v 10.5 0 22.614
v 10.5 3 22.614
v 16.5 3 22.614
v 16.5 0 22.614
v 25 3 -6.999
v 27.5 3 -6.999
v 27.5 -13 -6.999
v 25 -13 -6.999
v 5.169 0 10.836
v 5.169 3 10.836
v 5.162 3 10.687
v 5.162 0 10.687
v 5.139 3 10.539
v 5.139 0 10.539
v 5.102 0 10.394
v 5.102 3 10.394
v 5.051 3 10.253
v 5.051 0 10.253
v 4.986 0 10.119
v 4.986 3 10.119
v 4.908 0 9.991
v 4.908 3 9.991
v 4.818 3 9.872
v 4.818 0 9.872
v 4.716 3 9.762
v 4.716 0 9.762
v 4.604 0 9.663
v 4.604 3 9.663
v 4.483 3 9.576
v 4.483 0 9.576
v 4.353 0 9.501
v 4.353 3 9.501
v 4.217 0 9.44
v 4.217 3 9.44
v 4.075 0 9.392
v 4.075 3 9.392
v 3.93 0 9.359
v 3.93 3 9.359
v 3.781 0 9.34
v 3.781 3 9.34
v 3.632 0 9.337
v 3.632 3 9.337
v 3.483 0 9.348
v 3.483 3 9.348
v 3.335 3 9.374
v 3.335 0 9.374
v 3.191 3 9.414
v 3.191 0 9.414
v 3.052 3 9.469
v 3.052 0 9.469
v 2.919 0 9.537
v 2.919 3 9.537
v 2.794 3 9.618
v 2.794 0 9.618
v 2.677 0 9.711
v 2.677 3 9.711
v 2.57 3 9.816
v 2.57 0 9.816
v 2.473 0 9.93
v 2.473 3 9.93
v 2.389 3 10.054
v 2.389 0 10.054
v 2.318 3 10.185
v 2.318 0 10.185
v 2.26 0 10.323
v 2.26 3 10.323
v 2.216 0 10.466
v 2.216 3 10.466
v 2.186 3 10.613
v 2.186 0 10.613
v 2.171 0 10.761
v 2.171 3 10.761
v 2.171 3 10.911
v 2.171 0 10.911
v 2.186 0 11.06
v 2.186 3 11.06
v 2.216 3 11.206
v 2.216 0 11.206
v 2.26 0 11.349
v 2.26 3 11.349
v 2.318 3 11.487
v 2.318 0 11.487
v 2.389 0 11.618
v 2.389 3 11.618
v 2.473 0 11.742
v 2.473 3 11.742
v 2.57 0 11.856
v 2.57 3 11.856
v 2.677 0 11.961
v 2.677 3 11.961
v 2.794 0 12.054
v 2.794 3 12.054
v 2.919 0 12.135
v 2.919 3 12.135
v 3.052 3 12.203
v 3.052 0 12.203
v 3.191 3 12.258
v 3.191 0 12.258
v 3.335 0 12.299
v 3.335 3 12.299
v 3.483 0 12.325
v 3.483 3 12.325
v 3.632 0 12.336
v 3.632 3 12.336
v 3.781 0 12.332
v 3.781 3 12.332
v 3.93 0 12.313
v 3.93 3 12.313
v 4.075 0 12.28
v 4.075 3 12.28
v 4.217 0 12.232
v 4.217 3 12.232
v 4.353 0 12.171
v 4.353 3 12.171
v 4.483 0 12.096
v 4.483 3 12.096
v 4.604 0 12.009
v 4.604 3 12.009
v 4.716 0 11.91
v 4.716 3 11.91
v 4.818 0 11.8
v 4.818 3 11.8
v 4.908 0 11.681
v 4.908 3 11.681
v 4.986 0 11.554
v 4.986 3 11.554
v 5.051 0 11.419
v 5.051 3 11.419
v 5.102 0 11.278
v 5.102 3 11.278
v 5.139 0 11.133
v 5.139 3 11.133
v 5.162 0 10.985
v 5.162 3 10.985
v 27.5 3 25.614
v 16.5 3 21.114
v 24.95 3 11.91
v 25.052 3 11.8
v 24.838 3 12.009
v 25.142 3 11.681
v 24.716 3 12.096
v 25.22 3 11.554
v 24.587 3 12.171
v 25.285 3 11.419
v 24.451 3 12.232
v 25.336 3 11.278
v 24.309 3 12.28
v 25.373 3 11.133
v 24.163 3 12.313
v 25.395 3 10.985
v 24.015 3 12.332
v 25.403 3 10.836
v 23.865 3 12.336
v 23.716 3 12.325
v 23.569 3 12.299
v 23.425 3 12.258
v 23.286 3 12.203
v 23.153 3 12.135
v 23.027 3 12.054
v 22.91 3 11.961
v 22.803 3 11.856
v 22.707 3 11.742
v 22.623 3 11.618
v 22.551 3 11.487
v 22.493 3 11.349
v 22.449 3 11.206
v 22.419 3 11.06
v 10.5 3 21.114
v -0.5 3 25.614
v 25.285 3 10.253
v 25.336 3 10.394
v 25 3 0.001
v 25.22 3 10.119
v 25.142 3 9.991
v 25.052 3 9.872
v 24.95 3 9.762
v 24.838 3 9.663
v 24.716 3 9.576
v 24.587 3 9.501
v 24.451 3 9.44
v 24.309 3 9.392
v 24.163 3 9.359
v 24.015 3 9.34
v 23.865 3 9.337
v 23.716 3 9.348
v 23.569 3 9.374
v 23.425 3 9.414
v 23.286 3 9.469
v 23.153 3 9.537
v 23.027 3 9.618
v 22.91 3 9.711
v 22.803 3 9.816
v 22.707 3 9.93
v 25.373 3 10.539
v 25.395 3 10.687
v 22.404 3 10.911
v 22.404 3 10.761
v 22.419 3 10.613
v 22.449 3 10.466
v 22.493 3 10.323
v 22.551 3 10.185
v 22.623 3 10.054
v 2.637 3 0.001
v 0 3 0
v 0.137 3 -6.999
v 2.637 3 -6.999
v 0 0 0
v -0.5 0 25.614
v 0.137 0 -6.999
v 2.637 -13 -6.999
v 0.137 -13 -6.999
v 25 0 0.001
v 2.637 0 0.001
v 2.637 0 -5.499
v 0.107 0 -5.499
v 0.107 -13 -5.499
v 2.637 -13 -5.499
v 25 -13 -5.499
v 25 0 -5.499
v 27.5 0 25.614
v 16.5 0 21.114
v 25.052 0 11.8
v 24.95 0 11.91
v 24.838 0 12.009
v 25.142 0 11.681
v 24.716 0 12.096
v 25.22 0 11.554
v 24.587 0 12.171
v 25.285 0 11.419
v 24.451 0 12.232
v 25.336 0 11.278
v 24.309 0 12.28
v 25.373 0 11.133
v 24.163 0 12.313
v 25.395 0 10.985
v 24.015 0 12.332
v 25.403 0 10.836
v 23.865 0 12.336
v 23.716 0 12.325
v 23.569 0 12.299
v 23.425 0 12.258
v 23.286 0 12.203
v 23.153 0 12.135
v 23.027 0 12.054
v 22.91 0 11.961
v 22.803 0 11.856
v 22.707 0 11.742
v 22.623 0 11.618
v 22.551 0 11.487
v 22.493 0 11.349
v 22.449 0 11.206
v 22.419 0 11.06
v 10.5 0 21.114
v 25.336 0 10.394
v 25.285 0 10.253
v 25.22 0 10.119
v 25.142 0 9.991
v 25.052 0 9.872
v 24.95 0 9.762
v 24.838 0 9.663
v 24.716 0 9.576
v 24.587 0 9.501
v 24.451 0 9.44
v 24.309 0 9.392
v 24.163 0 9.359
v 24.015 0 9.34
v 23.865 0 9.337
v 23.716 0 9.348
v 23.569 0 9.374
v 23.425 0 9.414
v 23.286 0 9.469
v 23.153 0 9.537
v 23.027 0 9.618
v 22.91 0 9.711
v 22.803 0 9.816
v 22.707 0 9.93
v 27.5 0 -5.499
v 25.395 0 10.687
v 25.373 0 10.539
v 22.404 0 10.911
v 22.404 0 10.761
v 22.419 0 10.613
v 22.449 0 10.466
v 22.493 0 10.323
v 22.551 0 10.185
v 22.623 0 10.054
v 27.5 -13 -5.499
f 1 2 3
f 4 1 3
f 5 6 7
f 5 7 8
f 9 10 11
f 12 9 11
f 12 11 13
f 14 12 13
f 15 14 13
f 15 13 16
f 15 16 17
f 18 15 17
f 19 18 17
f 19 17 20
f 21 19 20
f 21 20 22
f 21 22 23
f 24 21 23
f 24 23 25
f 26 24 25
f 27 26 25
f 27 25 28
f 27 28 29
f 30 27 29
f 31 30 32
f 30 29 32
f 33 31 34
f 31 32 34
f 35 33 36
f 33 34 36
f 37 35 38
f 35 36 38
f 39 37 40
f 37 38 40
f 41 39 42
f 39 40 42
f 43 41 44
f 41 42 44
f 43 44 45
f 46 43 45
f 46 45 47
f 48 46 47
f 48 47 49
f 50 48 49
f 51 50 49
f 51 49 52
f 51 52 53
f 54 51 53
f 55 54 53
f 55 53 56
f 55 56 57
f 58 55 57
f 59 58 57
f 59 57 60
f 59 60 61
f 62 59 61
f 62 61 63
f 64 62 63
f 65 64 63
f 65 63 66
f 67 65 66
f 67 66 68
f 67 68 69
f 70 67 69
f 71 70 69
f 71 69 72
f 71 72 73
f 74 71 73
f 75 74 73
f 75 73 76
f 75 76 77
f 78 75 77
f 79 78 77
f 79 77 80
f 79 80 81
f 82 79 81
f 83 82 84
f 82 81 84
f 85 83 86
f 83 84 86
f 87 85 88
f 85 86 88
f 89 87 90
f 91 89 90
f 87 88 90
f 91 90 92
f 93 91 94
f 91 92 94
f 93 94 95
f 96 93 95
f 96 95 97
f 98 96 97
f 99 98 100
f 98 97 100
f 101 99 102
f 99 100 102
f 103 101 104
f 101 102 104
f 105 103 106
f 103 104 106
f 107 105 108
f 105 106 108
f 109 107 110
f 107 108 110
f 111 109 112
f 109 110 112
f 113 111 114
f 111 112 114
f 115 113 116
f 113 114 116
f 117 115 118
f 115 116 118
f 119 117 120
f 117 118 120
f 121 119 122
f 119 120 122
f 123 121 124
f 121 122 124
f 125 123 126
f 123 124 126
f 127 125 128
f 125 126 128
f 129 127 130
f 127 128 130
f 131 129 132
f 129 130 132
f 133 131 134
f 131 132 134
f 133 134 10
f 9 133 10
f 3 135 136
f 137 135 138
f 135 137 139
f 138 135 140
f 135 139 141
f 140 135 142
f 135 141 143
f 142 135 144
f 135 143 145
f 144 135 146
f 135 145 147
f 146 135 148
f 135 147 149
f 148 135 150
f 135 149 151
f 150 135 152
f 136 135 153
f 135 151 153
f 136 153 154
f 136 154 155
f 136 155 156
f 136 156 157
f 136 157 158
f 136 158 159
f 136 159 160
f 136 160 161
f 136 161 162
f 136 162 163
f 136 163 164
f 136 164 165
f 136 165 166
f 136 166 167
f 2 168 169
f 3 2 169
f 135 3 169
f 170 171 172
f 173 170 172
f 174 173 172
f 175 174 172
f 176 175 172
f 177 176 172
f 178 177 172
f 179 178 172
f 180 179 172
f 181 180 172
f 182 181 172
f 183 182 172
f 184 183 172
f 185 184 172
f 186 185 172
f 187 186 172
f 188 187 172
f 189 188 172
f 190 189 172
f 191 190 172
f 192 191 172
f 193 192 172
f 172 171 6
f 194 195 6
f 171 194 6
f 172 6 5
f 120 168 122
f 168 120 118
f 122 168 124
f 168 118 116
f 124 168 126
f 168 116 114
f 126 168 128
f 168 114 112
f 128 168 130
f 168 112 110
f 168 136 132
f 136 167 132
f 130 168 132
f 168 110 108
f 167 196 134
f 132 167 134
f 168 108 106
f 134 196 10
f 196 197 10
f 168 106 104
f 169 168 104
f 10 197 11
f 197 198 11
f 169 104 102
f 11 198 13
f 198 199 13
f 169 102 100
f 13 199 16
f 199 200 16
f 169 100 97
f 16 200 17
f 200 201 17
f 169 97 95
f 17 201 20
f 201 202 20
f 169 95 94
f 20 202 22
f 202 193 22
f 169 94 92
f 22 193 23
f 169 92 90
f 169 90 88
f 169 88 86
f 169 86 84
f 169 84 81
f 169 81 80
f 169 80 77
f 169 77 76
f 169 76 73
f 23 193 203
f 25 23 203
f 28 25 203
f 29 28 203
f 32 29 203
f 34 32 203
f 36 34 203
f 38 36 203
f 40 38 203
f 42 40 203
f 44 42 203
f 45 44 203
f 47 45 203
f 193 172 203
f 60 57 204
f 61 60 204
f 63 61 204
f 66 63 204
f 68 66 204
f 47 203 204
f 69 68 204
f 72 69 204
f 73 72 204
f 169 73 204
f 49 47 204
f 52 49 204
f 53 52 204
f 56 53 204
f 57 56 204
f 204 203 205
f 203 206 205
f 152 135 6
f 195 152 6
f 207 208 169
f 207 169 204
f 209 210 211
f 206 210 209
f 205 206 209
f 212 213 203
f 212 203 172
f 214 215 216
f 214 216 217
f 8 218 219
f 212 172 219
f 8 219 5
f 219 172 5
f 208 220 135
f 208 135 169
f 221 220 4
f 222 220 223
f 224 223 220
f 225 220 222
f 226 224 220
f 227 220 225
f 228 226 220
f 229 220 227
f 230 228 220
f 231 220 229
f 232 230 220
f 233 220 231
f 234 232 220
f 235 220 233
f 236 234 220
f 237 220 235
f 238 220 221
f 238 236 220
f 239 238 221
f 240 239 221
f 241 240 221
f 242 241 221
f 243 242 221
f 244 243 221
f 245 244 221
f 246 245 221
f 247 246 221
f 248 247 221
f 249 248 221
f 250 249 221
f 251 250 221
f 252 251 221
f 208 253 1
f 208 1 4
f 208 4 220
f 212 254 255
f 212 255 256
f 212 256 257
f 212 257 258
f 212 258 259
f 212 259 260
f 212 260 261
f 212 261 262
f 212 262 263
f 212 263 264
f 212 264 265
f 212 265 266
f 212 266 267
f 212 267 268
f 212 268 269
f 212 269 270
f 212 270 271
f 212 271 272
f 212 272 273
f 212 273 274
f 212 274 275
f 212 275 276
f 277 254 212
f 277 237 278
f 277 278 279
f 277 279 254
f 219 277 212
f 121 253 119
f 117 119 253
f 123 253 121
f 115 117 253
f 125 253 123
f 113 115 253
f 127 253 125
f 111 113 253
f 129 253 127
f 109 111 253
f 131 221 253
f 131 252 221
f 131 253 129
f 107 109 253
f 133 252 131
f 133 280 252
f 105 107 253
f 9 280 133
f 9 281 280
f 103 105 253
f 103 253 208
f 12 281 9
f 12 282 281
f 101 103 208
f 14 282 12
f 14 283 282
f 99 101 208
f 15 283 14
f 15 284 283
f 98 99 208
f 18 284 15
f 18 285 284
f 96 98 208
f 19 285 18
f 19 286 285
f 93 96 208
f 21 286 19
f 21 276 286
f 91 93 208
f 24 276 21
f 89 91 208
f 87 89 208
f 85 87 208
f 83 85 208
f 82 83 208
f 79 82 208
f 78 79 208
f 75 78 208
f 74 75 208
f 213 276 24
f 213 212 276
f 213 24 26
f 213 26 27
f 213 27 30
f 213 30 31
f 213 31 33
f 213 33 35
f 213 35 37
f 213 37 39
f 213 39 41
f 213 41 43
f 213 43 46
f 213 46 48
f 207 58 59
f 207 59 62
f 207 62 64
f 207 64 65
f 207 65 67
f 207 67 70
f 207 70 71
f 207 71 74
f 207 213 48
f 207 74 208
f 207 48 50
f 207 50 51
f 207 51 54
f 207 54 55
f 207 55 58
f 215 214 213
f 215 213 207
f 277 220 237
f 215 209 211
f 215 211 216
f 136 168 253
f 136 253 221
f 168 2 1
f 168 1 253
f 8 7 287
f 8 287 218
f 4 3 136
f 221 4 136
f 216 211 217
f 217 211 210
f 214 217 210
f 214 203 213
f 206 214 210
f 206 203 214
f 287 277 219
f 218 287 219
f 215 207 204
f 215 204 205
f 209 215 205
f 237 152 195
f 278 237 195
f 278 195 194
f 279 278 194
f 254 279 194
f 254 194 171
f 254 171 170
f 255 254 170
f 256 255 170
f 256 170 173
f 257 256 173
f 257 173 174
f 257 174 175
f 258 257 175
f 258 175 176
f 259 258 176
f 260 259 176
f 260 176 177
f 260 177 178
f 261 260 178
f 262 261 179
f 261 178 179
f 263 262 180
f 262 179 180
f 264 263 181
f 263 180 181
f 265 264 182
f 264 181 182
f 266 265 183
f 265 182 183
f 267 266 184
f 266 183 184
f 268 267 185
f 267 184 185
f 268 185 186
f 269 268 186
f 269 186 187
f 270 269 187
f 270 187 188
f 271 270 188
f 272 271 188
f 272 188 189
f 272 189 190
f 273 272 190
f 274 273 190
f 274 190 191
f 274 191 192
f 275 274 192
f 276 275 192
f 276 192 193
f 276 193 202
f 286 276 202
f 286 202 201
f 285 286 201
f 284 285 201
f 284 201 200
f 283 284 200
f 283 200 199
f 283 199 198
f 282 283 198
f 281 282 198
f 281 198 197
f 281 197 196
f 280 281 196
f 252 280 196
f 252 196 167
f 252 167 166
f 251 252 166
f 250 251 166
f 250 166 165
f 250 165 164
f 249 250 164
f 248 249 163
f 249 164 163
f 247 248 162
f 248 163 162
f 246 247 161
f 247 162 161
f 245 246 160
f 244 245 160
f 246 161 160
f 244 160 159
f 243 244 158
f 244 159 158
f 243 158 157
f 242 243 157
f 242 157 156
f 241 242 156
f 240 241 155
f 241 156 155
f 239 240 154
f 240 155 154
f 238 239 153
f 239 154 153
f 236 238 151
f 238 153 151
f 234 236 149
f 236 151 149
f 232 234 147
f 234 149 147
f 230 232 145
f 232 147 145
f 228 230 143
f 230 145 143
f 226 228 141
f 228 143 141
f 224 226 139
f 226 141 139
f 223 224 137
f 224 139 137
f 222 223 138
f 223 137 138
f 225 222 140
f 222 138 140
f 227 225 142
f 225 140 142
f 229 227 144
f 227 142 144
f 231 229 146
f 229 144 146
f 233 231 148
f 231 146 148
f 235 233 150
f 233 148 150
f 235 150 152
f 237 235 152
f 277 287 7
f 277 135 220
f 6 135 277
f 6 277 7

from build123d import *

# Parameters (mm, degrees)
BOSS_EXTRUDE1_DEPTH = 3
BOSS_EXTRUDE2_DEPTH = 13
SKETCH4_W           = 2.5
SKETCH4_H           = 1.5
BOSS_EXTRUDE3_DEPTH = 13
SKETCH5_R           = 1.5
CUT_EXTRUDE2_DEPTH  = 10
SKETCH6_W           = 6
SKETCH6_H           = 1.5
CUT_EXTRUDE3_DEPTH  = 10


with BuildPart() as part:
    # Sketch1 → Boss-Extrude1 (new body)
    with BuildSketch(Plane(origin=(0, 0, 0), x_dir=(1, 0, 0), z_dir=(0, 1, 0))):
        Polygon((2.636620285, -0.001333349), (24.999999567, -0.001333349), (24.999999567, 6.998666651), (27.499999567, 6.998666651), (27.499999567, 0.004879765), (27.499999567, -25.613592849), (-0.500000433, -25.613592849), (0, 0), (0.136620285, 6.998666651), (2.636620285, 6.998666651), align=None)
    extrude(amount=BOSS_EXTRUDE1_DEPTH)

    # Sketch2 → Boss-Extrude2 (add)
    with BuildSketch(Plane(origin=(0, 0, 0), x_dir=(-1, 0, 0), z_dir=(0, -1, 0))):
        Polygon((-2.636620285, 6.998666651), (-0.136620285, 6.998666651), (-0.107338932, 5.498666651), (-2.636620285, 5.498666651), align=None)
    extrude(amount=BOSS_EXTRUDE2_DEPTH)

    # Sketch4 → Boss-Extrude3 (add)
    with BuildSketch(Plane(origin=(0, 0, 0), x_dir=(-1, 0, 0), z_dir=(0, -1, 0))):
        with Locations((-26.249999567, 6.248666651)):
            Rectangle(SKETCH4_W, SKETCH4_H)
    extrude(amount=BOSS_EXTRUDE3_DEPTH)

    # Sketch5 → Cut-Extrude2 (cut)
    with BuildSketch(Plane(origin=(0, 3, 0), x_dir=(1, 0, 0), z_dir=(0, 1, 0))):
        with Locations((3.669128533, -10.836145103)):
            Circle(SKETCH5_R)
        with Locations((23.902624268, -10.836145103)):
            Circle(SKETCH5_R)
    extrude(amount=-CUT_EXTRUDE2_DEPTH, mode=Mode.SUBTRACT)

    # Sketch6 → Cut-Extrude3 (cut)
    with BuildSketch(Plane(origin=(0, 3, 0), x_dir=(1, 0, 0), z_dir=(0, 1, 0))):
        with Locations((13.499999567, -21.863592849)):
            Rectangle(SKETCH6_W, SKETCH6_H)
    extrude(amount=-CUT_EXTRUDE3_DEPTH, mode=Mode.SUBTRACT)


solid = part.part
